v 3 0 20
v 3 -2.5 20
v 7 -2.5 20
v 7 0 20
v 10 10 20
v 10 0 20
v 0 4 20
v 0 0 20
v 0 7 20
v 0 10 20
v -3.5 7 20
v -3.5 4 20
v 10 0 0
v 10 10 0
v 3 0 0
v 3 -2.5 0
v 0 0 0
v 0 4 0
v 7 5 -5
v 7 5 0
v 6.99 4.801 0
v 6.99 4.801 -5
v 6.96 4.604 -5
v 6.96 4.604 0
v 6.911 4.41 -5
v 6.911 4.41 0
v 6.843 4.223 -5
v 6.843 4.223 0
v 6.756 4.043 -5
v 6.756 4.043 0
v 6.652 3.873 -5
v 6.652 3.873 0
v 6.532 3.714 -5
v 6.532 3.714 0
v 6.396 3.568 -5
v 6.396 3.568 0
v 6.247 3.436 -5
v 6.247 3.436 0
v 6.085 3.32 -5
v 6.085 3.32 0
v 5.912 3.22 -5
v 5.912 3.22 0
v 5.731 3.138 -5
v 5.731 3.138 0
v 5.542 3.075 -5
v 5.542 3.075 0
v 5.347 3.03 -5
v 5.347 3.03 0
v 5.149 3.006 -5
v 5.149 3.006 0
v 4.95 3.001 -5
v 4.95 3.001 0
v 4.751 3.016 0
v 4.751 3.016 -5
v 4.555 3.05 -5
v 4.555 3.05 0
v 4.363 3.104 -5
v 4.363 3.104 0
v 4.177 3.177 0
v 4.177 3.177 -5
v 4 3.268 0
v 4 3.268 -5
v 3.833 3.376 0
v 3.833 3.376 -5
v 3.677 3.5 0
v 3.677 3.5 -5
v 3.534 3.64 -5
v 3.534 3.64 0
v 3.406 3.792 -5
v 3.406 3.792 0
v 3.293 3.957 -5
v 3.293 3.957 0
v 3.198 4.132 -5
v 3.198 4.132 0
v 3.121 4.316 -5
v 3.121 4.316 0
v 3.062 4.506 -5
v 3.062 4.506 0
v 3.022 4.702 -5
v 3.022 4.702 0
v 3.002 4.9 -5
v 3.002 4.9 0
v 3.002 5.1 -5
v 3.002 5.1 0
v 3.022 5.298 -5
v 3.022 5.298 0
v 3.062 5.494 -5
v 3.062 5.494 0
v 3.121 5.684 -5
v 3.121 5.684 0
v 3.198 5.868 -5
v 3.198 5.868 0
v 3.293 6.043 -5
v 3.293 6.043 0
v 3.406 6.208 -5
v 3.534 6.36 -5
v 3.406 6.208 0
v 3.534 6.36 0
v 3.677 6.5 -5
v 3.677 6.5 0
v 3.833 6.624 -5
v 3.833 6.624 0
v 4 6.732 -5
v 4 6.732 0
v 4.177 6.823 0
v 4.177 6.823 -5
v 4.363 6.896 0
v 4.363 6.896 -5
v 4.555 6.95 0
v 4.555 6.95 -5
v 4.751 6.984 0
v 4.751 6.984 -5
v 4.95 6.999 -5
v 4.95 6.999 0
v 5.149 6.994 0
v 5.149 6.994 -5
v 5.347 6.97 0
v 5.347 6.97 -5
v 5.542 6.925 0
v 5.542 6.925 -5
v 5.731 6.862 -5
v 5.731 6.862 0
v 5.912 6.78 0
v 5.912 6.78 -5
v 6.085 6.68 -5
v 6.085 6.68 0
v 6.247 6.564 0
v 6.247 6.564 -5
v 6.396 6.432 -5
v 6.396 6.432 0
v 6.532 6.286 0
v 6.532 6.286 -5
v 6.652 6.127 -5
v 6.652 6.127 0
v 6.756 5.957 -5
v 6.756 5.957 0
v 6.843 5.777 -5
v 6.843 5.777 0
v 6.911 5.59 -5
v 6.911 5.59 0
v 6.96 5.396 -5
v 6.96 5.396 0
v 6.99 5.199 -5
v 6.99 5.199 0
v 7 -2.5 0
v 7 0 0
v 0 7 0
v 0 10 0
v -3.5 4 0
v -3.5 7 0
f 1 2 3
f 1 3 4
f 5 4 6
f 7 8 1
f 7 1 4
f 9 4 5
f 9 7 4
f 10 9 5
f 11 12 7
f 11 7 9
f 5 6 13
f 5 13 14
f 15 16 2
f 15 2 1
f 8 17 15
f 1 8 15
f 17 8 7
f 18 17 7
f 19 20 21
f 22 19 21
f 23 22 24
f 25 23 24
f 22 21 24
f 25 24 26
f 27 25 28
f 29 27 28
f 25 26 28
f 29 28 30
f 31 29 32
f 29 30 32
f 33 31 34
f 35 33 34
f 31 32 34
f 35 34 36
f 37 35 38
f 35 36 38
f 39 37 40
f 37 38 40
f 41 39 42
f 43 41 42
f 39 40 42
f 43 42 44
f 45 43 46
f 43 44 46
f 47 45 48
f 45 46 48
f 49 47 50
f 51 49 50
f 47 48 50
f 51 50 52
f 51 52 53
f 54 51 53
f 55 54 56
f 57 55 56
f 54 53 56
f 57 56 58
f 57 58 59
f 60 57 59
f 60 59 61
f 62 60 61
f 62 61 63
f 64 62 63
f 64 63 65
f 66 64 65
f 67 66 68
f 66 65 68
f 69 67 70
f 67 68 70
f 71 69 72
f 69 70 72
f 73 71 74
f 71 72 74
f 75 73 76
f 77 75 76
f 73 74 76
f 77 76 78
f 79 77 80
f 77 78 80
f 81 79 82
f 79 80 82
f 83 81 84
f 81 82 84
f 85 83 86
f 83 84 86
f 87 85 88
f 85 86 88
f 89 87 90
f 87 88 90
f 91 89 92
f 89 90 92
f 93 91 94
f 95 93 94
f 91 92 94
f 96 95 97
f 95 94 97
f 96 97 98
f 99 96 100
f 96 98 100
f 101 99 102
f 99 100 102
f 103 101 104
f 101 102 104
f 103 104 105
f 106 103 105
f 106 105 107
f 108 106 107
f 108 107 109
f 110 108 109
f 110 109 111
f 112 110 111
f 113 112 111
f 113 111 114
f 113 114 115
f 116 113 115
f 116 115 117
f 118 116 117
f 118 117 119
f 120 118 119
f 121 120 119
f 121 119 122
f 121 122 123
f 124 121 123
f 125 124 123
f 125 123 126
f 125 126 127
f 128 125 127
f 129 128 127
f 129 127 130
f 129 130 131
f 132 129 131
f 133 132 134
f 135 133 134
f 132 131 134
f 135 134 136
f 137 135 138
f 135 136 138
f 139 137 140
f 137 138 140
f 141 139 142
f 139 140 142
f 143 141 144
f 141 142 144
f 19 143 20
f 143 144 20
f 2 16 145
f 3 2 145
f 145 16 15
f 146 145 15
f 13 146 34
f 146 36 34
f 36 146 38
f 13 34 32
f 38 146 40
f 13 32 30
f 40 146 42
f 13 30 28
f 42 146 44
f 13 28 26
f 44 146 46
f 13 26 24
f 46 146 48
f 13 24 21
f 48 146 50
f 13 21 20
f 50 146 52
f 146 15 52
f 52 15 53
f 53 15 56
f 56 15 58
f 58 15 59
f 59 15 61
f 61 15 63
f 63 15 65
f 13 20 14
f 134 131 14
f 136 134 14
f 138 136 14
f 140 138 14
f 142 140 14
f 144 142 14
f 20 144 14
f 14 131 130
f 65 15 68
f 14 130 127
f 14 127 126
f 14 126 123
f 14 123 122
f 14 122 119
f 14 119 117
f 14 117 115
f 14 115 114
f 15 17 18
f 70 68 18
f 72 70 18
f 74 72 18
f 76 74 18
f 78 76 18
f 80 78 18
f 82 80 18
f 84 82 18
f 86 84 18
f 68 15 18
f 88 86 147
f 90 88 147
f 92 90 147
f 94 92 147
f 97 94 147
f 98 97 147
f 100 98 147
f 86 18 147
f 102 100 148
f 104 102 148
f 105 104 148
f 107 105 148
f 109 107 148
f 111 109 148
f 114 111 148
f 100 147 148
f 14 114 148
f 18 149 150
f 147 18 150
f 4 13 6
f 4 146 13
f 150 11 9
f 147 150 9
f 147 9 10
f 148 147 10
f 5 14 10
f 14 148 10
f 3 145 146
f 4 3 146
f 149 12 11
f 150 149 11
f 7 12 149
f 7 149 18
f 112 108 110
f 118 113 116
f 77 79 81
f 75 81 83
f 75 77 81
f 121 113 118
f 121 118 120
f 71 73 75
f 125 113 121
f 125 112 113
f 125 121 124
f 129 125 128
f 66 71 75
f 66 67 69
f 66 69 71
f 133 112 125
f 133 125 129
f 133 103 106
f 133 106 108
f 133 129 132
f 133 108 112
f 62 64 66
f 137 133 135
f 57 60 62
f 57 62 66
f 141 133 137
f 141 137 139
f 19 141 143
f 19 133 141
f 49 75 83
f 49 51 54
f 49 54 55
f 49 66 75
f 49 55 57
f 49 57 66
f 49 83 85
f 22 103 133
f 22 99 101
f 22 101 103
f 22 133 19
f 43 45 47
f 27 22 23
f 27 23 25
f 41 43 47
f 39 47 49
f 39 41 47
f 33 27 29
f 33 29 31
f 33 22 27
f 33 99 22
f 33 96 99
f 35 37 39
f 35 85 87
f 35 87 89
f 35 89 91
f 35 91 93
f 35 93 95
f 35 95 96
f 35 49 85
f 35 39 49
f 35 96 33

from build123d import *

# Parameters (mm, degrees)
F0_W     = 9.5
F0_H     = 10
F1_DEPTH = 20
F2_W     = 3.5
F2_H     = 3
F3_DEPTH = 20
F2_W_2   = 4
F2_H_2   = 2.5
F5_DEPTH = 20
F6_R     = 2
F7_DEPTH = 5
F8_W     = 10
F8_H     = 20
F9_DEPTH = 0.5


# Not quite as in the source:
# - a feature names something its author has since deleted; it is built from what else it names


with BuildPart() as f1:
    # F0 (on Top) → F1 (new body)
    with BuildSketch(Plane.XY):
        with Locations((4.75, 5)):
            Rectangle(F0_W, F0_H)
    extrude(amount=F1_DEPTH)

    # F2 (on face) → F3 (join, through all)
    with BuildSketch(Plane.XY.offset(20)):
        with Locations((-1.75, 5.5)):
            Rectangle(F2_W, F2_H)
    extrude(amount=-F3_DEPTH)

    # F2 (on face) → F5 (join, through all)
    with BuildSketch(Plane.XY.offset(20)):
        with Locations((5, -1.25)):
            Rectangle(F2_W_2, F2_H_2)
    extrude(amount=-F5_DEPTH)

    # F6 (on face) → F7 (join)
    with BuildSketch(Plane(origin=(0, 0, 0), x_dir=(1, 0, 0), z_dir=(0, 0, -1))):
        with Locations((5, -5)):
            Circle(F6_R)
    extrude(amount=F7_DEPTH)

    # F8 (on face) → F9 (join)
    with BuildSketch(Plane.YZ.offset(9.5)):
        with Locations((5, 10)):
            Rectangle(F8_W, F8_H)
    extrude(amount=F9_DEPTH)


solid = f1.part
